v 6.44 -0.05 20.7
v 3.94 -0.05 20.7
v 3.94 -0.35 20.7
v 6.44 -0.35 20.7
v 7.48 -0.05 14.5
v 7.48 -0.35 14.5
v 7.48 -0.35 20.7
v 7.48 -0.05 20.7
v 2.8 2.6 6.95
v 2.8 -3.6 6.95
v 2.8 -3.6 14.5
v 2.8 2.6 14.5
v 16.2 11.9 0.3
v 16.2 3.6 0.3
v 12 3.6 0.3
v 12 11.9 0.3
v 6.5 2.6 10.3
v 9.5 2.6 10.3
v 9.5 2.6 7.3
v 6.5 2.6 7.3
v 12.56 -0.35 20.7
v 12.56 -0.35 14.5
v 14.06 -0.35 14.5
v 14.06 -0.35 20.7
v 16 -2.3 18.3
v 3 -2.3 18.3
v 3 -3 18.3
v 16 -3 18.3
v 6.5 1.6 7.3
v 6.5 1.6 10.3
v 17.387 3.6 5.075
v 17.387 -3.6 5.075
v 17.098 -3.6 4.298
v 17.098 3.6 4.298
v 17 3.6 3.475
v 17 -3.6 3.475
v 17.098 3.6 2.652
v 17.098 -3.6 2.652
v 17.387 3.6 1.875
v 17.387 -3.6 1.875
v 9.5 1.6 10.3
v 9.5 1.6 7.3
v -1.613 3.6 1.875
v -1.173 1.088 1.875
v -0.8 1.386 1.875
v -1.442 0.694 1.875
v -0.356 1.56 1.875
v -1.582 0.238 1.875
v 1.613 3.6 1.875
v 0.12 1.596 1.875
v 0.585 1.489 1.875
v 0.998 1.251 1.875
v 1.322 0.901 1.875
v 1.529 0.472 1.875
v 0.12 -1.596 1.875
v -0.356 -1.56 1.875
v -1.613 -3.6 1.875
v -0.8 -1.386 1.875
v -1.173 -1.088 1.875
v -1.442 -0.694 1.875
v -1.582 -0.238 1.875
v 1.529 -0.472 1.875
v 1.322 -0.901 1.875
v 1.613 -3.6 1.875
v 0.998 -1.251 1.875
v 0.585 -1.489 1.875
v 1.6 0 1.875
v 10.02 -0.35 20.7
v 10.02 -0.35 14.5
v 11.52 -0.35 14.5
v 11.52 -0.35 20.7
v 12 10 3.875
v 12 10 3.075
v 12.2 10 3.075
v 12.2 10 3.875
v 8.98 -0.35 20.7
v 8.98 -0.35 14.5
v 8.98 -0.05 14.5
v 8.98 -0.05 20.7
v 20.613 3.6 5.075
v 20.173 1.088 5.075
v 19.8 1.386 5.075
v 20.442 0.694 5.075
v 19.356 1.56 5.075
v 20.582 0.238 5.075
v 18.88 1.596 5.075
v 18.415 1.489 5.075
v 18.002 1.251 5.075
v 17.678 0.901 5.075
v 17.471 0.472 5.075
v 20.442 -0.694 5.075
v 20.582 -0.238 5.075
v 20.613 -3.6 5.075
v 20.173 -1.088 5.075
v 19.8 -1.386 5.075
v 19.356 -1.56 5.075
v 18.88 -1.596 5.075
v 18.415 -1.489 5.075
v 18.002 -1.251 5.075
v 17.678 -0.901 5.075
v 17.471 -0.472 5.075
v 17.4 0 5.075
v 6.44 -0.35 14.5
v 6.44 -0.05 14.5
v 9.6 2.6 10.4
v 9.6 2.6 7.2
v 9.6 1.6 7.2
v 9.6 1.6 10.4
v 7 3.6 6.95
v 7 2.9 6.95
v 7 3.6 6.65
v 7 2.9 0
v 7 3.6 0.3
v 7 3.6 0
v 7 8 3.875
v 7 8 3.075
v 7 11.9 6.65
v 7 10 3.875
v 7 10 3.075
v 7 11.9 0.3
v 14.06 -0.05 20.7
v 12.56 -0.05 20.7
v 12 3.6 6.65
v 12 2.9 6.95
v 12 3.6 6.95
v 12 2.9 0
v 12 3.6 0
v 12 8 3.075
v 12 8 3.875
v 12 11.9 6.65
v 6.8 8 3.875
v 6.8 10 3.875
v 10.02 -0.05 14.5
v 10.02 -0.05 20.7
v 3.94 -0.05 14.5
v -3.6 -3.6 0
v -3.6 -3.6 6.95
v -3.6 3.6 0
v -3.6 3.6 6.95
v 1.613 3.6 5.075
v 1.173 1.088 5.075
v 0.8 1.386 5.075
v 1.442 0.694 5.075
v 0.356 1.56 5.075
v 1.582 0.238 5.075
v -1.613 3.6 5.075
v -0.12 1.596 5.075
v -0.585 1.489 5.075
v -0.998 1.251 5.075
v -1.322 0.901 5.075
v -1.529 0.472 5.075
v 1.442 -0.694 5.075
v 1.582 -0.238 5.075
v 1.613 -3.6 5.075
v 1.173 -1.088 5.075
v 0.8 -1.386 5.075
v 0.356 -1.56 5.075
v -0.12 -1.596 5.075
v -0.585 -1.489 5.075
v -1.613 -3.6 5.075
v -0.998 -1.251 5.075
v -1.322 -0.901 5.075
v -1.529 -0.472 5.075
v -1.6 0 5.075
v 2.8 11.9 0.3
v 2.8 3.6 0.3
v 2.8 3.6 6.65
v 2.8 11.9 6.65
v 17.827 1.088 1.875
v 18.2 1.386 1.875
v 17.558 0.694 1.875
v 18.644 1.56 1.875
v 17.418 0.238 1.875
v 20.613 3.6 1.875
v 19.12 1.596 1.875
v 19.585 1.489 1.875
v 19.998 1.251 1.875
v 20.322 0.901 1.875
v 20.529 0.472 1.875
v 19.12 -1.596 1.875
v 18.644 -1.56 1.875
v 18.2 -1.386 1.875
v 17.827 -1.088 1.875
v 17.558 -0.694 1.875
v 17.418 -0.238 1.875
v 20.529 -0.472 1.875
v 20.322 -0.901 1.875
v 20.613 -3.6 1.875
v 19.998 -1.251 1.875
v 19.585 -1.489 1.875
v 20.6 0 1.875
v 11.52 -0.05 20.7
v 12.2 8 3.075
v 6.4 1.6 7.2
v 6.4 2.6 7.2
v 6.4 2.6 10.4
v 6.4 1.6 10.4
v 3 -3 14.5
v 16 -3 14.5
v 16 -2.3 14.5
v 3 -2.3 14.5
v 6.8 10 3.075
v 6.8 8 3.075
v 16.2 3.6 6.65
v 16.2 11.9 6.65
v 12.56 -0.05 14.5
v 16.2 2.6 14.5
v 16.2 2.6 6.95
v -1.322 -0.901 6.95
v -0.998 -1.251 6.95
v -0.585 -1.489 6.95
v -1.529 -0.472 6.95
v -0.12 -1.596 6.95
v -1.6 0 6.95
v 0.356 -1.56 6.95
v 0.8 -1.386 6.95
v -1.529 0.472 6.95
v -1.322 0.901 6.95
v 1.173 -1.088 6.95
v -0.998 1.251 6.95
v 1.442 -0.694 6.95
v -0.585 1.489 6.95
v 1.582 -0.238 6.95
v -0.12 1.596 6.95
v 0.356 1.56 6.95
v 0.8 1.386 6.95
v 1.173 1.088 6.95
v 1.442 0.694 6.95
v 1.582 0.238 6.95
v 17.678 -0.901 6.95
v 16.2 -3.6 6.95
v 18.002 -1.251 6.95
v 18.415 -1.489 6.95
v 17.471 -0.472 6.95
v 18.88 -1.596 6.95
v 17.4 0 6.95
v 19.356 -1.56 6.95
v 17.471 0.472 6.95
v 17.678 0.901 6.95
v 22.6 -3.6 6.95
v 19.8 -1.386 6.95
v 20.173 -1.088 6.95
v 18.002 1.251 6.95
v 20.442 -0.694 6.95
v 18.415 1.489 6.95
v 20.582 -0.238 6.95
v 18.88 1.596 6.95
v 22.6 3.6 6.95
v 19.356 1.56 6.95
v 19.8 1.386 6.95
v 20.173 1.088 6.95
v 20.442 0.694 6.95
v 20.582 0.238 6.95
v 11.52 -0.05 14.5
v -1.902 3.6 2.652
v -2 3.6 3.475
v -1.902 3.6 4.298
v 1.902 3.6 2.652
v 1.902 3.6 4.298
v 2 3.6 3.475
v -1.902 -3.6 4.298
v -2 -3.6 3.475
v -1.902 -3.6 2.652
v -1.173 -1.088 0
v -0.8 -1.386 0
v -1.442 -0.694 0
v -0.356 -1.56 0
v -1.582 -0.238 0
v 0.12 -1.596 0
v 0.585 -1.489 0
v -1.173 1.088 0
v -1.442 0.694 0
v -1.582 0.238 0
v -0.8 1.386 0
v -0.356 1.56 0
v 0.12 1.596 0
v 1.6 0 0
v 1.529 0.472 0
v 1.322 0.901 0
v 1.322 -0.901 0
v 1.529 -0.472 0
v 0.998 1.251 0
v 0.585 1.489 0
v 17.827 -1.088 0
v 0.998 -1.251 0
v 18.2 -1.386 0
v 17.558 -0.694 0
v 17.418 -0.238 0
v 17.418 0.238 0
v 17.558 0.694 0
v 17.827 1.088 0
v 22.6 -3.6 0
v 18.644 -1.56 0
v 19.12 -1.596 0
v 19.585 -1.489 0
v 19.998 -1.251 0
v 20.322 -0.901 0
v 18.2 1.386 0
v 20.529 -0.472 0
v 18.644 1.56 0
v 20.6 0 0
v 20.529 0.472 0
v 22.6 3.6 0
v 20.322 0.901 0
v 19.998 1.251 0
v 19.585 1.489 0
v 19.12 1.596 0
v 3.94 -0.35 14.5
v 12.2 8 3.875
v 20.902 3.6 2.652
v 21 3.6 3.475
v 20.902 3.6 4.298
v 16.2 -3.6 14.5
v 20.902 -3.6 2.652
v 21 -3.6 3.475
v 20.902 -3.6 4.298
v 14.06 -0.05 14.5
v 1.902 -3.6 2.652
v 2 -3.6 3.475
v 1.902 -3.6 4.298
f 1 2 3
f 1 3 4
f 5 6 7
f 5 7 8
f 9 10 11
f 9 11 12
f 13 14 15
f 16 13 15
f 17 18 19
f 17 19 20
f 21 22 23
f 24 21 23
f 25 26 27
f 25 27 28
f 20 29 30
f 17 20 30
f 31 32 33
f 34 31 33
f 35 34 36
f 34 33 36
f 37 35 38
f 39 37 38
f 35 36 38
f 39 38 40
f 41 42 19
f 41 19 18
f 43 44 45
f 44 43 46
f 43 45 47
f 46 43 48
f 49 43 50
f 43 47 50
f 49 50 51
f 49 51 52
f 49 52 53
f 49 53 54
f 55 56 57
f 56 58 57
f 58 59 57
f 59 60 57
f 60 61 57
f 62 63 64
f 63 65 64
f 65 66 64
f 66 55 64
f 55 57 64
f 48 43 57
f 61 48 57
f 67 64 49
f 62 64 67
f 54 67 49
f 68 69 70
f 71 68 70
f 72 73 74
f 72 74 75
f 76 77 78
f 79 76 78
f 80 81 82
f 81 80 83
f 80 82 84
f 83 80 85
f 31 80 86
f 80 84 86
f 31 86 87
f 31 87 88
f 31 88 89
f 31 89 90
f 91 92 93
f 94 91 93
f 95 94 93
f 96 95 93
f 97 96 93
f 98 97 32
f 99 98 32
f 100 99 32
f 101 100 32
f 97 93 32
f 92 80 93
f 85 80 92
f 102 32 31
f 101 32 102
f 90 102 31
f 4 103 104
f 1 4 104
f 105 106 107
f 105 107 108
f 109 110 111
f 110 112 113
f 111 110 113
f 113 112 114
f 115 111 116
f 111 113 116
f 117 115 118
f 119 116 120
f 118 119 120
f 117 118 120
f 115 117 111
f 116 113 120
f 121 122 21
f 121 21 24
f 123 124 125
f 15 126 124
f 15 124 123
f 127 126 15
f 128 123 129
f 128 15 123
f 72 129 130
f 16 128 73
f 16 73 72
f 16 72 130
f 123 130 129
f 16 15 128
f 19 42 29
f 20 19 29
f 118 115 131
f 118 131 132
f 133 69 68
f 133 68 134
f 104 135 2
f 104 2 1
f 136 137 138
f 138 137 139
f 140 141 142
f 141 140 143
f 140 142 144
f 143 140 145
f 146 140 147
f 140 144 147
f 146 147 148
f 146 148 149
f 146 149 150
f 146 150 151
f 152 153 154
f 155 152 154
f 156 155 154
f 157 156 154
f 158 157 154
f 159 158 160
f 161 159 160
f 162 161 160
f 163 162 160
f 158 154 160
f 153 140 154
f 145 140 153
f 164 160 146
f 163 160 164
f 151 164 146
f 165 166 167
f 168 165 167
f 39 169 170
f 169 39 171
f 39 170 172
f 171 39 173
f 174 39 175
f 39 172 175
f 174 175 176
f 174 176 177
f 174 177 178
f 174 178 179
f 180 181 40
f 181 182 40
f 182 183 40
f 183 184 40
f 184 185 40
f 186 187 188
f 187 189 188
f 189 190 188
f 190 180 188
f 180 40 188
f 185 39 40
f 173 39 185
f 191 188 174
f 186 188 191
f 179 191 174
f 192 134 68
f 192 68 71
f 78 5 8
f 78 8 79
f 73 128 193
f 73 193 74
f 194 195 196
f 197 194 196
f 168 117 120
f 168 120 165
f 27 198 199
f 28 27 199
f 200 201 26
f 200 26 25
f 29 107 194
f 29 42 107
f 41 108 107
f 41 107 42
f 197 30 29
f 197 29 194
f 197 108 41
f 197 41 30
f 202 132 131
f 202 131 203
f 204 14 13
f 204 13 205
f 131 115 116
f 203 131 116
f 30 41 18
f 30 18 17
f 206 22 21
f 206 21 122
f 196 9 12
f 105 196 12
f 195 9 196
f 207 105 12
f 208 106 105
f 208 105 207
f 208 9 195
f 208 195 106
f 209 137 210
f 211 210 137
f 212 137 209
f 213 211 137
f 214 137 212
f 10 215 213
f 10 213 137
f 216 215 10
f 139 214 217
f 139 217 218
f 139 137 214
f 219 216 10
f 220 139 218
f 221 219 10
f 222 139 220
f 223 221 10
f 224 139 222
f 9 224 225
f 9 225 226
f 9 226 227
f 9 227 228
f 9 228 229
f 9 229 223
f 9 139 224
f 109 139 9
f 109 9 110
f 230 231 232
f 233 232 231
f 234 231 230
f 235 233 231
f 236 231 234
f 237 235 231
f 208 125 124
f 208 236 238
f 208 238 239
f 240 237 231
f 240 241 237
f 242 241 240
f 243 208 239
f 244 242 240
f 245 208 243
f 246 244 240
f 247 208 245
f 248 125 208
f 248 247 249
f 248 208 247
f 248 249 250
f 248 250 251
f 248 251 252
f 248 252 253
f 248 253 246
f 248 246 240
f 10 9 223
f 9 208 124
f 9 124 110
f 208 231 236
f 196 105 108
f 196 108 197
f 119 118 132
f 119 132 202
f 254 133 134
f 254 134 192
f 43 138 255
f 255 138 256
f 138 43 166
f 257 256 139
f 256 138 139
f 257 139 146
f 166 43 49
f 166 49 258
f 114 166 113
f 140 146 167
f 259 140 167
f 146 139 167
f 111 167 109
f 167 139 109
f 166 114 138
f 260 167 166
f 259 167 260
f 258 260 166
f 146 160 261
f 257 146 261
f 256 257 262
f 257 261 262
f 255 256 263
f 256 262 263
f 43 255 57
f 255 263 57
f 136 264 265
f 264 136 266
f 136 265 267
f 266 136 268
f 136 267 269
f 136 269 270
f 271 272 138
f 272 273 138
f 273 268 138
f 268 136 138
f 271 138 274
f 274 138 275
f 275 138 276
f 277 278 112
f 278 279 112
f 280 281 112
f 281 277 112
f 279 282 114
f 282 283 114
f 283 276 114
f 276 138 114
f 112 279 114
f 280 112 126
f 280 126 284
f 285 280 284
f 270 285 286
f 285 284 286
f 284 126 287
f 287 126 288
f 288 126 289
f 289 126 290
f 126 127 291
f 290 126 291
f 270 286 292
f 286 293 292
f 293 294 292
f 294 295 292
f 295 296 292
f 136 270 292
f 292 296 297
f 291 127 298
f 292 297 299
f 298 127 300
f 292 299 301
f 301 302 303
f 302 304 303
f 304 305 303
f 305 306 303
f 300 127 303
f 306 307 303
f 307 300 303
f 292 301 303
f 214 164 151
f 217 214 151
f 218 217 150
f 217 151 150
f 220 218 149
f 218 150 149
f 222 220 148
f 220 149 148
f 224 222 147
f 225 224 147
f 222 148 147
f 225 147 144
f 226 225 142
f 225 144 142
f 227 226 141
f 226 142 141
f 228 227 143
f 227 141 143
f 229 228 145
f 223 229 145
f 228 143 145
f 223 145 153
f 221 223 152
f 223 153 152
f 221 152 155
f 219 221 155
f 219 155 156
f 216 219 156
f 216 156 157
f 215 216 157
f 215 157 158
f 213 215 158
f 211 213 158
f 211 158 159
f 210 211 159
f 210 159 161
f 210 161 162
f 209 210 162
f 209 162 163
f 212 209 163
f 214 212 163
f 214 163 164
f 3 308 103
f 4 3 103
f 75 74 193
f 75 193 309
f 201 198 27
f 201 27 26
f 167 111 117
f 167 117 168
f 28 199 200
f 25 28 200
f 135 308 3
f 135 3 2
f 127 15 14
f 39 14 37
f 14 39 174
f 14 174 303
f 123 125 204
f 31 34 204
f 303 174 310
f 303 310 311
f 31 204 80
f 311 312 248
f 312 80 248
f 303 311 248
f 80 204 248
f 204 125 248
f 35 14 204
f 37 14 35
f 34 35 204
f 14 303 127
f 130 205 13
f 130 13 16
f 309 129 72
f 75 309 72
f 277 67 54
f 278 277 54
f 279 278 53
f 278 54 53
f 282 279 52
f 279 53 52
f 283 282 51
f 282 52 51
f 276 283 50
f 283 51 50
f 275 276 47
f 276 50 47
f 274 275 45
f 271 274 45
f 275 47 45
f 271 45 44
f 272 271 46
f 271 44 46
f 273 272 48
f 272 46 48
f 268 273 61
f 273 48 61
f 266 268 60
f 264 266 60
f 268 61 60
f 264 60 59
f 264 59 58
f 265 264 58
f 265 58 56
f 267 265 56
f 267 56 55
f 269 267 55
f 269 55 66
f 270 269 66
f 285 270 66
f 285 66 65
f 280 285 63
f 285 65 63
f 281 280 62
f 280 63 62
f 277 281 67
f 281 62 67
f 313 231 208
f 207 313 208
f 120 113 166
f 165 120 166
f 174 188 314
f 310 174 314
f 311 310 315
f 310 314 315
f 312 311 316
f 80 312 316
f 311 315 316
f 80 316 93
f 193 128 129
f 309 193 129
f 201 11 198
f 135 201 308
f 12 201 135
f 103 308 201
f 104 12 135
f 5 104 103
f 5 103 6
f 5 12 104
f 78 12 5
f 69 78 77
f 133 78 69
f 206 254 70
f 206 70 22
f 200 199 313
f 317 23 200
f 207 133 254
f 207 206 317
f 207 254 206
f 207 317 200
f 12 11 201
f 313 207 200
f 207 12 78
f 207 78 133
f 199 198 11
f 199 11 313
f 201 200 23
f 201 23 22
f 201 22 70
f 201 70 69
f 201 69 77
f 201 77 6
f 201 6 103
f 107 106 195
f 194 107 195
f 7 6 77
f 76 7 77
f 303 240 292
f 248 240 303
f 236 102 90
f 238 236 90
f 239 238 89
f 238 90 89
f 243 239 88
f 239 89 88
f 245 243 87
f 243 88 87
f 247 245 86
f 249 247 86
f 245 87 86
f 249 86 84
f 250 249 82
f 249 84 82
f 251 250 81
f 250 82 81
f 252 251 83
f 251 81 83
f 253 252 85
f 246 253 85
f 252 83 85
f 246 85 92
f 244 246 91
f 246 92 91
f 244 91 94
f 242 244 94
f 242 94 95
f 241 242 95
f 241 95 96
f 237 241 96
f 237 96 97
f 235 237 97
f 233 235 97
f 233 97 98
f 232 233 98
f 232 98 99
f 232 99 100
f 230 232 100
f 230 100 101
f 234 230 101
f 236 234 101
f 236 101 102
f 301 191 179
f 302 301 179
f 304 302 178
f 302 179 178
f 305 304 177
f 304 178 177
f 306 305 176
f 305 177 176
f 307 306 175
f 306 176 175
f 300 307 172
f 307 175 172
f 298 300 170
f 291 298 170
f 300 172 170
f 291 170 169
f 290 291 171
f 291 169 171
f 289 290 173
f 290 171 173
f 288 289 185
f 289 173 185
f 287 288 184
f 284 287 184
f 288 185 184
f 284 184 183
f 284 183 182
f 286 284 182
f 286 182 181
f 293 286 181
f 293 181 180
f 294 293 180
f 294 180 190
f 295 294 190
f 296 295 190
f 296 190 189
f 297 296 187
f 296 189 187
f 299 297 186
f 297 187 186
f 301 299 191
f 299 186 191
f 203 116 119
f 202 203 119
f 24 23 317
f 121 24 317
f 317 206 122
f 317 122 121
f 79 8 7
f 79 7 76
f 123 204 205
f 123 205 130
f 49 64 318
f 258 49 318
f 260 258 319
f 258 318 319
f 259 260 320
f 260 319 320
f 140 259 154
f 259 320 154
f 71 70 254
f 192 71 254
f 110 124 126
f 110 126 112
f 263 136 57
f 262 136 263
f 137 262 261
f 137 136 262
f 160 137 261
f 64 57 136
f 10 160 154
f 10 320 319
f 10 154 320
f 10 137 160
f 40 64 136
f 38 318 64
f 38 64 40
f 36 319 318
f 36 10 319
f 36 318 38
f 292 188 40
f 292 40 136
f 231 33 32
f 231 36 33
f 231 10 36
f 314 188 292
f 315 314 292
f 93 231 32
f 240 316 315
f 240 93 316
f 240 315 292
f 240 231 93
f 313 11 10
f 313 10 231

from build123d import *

# Parameters (mm, degrees)
SKETCH1_W                      = 26.2
SKETCH1_H                      = 7.2
BOSS_EXTRUDE1_DEPTH            = 6.95
SKETCH2_W                      = 5
SKETCH2_H                      = 0.7
CUT_EXTRUDE1_DEPTH             = 24.916991868
CUT_EXTRUDE2_DEPTH             = 25.716441896
CUT_EXTRUDE3_DEPTH             = 25.716441896
SKETCH5_W                      = 13.4
SKETCH5_H                      = 6.2
BOSS_EXTRUDE2_DEPTH            = 7.55
SKETCH6_W                      = 13
SKETCH6_H                      = 0.7
BOSS_EXTRUDE3_DEPTH            = 3.8
SKETCH7_W                      = 1.5
SKETCH7_H                      = 0.3
BOSS_EXTRUDE4_DEPTH            = 6.2
SKETCH8_W                      = 1.5
SKETCH8_H                      = 0.3
BOSS_EXTRUDE5_DEPTH            = 6.2
SKETCH9_W                      = 1.5
SKETCH9_H                      = 0.3
BOSS_EXTRUDE6_DEPTH            = 6.2
SKETCH10_W                     = 2.5
SKETCH10_H                     = 0.3
BOSS_EXTRUDE7_DEPTH            = 6.2
SKETCH11_W                     = 3.2
SKETCH11_H                     = 3.2
CUT_EXTRUDE4_DEPTH             = 1
SKETCH12_W                     = 3
SKETCH12_H                     = 3
BOSS_EXTRUDE8_DEPTH            = 1
SKETCH13_W                     = 4.2
SKETCH13_H                     = 6.35
BOSS_EXTRUDE9_DEPTH            = 8.3
SKETCH14_W                     = 0.8
SKETCH14_H                     = 2
CUT_EXTRUDE5_DEPTH             = 0.2
SKETCH15_W                     = 4.2
SKETCH15_H                     = 6.35
BOSS_EXTRUDE10_DEPTH           = 8.3
SKETCH16_W                     = 0.8
SKETCH16_H                     = 2
CUT_EXTRUDE6_DEPTH             = 0.2
F_3_2_3_2_DIAMETER_HOLE1_D     = 3.2
F_3_2_3_2_DIAMETER_HOLE1_DEPTH = 1.875
F_3_2_3_2_DIAMETER_HOLE2_D     = 3.2
F_3_2_3_2_DIAMETER_HOLE2_DEPTH = 6.95


with BuildPart() as part:
    # Sketch1 → Boss-Extrude1 (new body)
    with BuildSketch(Plane.XY.offset(6.95)):
        with Locations((9.5, 0)):
            Rectangle(SKETCH1_W, SKETCH1_H)
    extrude(amount=-BOSS_EXTRUDE1_DEPTH)

    # Sketch2 → Cut-Extrude1 (cut, through all)
    with BuildSketch(Plane(origin=(0, 0, 0), x_dir=(-1, 0, 0), z_dir=(0, 0, -1))):
        with Locations((-9.5, 3.25)):
            Rectangle(SKETCH2_W, SKETCH2_H)
    extrude(amount=-CUT_EXTRUDE1_DEPTH, mode=Mode.SUBTRACT)

    # Sketch3 → Cut-Extrude2 (cut, through all)
    with BuildSketch(Plane.XZ.offset(3.6)):
        with BuildLine():
            Line((1.612876483, 5.075), (-1.612876483, 5.075))
            ThreePointArc((-1.612876483, 5.075), (-2, 3.475), (-1.612876483, 1.875))
            Line((-1.612876483, 1.875), (1.612876483, 1.875))
            ThreePointArc((1.612876483, 1.875), (2, 3.475), (1.612876483, 5.075))
        make_face()
    extrude(amount=-CUT_EXTRUDE2_DEPTH, mode=Mode.SUBTRACT)

    # Sketch4 → Cut-Extrude3 (cut, through all)
    with BuildSketch(Plane.XZ.offset(3.6)):
        with BuildLine():
            Line((17.387123517, 1.875), (20.612876483, 1.875))
            ThreePointArc((20.612876483, 1.875), (21, 3.475), (20.612876483, 5.075))
            Line((20.612876483, 5.075), (17.387123517, 5.075))
            ThreePointArc((17.387123517, 5.075), (17, 3.475), (17.387123517, 1.875))
        make_face()
    extrude(amount=-CUT_EXTRUDE3_DEPTH, mode=Mode.SUBTRACT)

    # Sketch5 → Boss-Extrude2 (add)
    with BuildSketch(Plane.XY.offset(6.95)):
        with Locations((9.5, -0.5)):
            Rectangle(SKETCH5_W, SKETCH5_H)
    extrude(amount=BOSS_EXTRUDE2_DEPTH)

    # Sketch6 → Boss-Extrude3 (add)
    with BuildSketch(Plane.XY.offset(14.5)):
        with Locations((9.5, -2.65)):
            Rectangle(SKETCH6_W, SKETCH6_H)
    extrude(amount=BOSS_EXTRUDE3_DEPTH)

    # Sketch7 → Boss-Extrude4 (add)
    with BuildSketch(Plane.XY.offset(14.5)):
        with Locations((13.31, -0.2)):
            Rectangle(SKETCH7_W, SKETCH7_H)
    extrude(amount=BOSS_EXTRUDE4_DEPTH)

    # Sketch8 → Boss-Extrude5 (add)
    with BuildSketch(Plane.XY.offset(14.5)):
        with Locations((10.77, -0.2)):
            Rectangle(SKETCH8_W, SKETCH8_H)
    extrude(amount=BOSS_EXTRUDE5_DEPTH)

    # Sketch9 → Boss-Extrude6 (add)
    with BuildSketch(Plane.XY.offset(14.5)):
        with Locations((8.23, -0.2)):
            Rectangle(SKETCH9_W, SKETCH9_H)
    extrude(amount=BOSS_EXTRUDE6_DEPTH)

    # Sketch10 → Boss-Extrude7 (add)
    with BuildSketch(Plane.XY.offset(14.5)):
        with Locations((5.19, -0.2)):
            Rectangle(SKETCH10_W, SKETCH10_H)
    extrude(amount=BOSS_EXTRUDE7_DEPTH)

    # Sketch11 → Cut-Extrude4 (cut)
    with BuildSketch(Plane(origin=(0, 2.6, 0), x_dir=(-1, 0, 0), z_dir=(0, 1, 0))):
        with Locations((-8, 8.8)):
            Rectangle(SKETCH11_W, SKETCH11_H)
    extrude(amount=-CUT_EXTRUDE4_DEPTH, mode=Mode.SUBTRACT)

    # Sketch12 → Boss-Extrude8 (add)
    with BuildSketch(Plane(origin=(0, 1.6, 0), x_dir=(-1, 0, 0), z_dir=(0, 1, 0))):
        with Locations((-8, 8.8)):
            Rectangle(SKETCH12_W, SKETCH12_H)
    extrude(amount=BOSS_EXTRUDE8_DEPTH)

    # Sketch13 → Boss-Extrude9 (add)
    with BuildSketch(Plane(origin=(0, 3.6, 0), x_dir=(-1, 0, 0), z_dir=(0, 1, 0))):
        with Locations((-14.1, 3.475)):
            Rectangle(SKETCH13_W, SKETCH13_H)
    extrude(amount=BOSS_EXTRUDE9_DEPTH)

    # Sketch14 → Cut-Extrude5 (cut)
    with BuildSketch(Plane.ZY.offset(-12)):
        with Locations((3.475, 9)):
            Rectangle(SKETCH14_W, SKETCH14_H)
    extrude(amount=-CUT_EXTRUDE5_DEPTH, mode=Mode.SUBTRACT)

    # Sketch15 → Boss-Extrude10 (add)
    with BuildSketch(Plane(origin=(0, 3.6, 0), x_dir=(-1, 0, 0), z_dir=(0, 1, 0))):
        with Locations((-4.9, 3.475)):
            Rectangle(SKETCH15_W, SKETCH15_H)
    extrude(amount=BOSS_EXTRUDE10_DEPTH)

    # Sketch16 → Cut-Extrude6 (cut)
    with BuildSketch(Plane(origin=(7, 0, 0), x_dir=(0, 0, -1), z_dir=(1, 0, 0))):
        with Locations((-3.475, 9)):
            Rectangle(SKETCH16_W, SKETCH16_H)
    extrude(amount=-CUT_EXTRUDE6_DEPTH, mode=Mode.SUBTRACT)

    # Ø3.2 (3.2) Diameter Hole1
    with Locations(Plane(origin=(0, 0, 0), x_dir=(-1, 0, 0), z_dir=(0, 0, -1))):
        with Locations((0, 0), (-19, 0)):
            Hole(F_3_2_3_2_DIAMETER_HOLE1_D / 2, depth=F_3_2_3_2_DIAMETER_HOLE1_DEPTH)

    # Ø3.2 (3.2) Diameter Hole2
    with Locations(Plane.XY.offset(6.95)):
        with Locations((19, 0), (0, 0)):
            Hole(F_3_2_3_2_DIAMETER_HOLE2_D / 2, depth=F_3_2_3_2_DIAMETER_HOLE2_DEPTH)


solid = part.part
